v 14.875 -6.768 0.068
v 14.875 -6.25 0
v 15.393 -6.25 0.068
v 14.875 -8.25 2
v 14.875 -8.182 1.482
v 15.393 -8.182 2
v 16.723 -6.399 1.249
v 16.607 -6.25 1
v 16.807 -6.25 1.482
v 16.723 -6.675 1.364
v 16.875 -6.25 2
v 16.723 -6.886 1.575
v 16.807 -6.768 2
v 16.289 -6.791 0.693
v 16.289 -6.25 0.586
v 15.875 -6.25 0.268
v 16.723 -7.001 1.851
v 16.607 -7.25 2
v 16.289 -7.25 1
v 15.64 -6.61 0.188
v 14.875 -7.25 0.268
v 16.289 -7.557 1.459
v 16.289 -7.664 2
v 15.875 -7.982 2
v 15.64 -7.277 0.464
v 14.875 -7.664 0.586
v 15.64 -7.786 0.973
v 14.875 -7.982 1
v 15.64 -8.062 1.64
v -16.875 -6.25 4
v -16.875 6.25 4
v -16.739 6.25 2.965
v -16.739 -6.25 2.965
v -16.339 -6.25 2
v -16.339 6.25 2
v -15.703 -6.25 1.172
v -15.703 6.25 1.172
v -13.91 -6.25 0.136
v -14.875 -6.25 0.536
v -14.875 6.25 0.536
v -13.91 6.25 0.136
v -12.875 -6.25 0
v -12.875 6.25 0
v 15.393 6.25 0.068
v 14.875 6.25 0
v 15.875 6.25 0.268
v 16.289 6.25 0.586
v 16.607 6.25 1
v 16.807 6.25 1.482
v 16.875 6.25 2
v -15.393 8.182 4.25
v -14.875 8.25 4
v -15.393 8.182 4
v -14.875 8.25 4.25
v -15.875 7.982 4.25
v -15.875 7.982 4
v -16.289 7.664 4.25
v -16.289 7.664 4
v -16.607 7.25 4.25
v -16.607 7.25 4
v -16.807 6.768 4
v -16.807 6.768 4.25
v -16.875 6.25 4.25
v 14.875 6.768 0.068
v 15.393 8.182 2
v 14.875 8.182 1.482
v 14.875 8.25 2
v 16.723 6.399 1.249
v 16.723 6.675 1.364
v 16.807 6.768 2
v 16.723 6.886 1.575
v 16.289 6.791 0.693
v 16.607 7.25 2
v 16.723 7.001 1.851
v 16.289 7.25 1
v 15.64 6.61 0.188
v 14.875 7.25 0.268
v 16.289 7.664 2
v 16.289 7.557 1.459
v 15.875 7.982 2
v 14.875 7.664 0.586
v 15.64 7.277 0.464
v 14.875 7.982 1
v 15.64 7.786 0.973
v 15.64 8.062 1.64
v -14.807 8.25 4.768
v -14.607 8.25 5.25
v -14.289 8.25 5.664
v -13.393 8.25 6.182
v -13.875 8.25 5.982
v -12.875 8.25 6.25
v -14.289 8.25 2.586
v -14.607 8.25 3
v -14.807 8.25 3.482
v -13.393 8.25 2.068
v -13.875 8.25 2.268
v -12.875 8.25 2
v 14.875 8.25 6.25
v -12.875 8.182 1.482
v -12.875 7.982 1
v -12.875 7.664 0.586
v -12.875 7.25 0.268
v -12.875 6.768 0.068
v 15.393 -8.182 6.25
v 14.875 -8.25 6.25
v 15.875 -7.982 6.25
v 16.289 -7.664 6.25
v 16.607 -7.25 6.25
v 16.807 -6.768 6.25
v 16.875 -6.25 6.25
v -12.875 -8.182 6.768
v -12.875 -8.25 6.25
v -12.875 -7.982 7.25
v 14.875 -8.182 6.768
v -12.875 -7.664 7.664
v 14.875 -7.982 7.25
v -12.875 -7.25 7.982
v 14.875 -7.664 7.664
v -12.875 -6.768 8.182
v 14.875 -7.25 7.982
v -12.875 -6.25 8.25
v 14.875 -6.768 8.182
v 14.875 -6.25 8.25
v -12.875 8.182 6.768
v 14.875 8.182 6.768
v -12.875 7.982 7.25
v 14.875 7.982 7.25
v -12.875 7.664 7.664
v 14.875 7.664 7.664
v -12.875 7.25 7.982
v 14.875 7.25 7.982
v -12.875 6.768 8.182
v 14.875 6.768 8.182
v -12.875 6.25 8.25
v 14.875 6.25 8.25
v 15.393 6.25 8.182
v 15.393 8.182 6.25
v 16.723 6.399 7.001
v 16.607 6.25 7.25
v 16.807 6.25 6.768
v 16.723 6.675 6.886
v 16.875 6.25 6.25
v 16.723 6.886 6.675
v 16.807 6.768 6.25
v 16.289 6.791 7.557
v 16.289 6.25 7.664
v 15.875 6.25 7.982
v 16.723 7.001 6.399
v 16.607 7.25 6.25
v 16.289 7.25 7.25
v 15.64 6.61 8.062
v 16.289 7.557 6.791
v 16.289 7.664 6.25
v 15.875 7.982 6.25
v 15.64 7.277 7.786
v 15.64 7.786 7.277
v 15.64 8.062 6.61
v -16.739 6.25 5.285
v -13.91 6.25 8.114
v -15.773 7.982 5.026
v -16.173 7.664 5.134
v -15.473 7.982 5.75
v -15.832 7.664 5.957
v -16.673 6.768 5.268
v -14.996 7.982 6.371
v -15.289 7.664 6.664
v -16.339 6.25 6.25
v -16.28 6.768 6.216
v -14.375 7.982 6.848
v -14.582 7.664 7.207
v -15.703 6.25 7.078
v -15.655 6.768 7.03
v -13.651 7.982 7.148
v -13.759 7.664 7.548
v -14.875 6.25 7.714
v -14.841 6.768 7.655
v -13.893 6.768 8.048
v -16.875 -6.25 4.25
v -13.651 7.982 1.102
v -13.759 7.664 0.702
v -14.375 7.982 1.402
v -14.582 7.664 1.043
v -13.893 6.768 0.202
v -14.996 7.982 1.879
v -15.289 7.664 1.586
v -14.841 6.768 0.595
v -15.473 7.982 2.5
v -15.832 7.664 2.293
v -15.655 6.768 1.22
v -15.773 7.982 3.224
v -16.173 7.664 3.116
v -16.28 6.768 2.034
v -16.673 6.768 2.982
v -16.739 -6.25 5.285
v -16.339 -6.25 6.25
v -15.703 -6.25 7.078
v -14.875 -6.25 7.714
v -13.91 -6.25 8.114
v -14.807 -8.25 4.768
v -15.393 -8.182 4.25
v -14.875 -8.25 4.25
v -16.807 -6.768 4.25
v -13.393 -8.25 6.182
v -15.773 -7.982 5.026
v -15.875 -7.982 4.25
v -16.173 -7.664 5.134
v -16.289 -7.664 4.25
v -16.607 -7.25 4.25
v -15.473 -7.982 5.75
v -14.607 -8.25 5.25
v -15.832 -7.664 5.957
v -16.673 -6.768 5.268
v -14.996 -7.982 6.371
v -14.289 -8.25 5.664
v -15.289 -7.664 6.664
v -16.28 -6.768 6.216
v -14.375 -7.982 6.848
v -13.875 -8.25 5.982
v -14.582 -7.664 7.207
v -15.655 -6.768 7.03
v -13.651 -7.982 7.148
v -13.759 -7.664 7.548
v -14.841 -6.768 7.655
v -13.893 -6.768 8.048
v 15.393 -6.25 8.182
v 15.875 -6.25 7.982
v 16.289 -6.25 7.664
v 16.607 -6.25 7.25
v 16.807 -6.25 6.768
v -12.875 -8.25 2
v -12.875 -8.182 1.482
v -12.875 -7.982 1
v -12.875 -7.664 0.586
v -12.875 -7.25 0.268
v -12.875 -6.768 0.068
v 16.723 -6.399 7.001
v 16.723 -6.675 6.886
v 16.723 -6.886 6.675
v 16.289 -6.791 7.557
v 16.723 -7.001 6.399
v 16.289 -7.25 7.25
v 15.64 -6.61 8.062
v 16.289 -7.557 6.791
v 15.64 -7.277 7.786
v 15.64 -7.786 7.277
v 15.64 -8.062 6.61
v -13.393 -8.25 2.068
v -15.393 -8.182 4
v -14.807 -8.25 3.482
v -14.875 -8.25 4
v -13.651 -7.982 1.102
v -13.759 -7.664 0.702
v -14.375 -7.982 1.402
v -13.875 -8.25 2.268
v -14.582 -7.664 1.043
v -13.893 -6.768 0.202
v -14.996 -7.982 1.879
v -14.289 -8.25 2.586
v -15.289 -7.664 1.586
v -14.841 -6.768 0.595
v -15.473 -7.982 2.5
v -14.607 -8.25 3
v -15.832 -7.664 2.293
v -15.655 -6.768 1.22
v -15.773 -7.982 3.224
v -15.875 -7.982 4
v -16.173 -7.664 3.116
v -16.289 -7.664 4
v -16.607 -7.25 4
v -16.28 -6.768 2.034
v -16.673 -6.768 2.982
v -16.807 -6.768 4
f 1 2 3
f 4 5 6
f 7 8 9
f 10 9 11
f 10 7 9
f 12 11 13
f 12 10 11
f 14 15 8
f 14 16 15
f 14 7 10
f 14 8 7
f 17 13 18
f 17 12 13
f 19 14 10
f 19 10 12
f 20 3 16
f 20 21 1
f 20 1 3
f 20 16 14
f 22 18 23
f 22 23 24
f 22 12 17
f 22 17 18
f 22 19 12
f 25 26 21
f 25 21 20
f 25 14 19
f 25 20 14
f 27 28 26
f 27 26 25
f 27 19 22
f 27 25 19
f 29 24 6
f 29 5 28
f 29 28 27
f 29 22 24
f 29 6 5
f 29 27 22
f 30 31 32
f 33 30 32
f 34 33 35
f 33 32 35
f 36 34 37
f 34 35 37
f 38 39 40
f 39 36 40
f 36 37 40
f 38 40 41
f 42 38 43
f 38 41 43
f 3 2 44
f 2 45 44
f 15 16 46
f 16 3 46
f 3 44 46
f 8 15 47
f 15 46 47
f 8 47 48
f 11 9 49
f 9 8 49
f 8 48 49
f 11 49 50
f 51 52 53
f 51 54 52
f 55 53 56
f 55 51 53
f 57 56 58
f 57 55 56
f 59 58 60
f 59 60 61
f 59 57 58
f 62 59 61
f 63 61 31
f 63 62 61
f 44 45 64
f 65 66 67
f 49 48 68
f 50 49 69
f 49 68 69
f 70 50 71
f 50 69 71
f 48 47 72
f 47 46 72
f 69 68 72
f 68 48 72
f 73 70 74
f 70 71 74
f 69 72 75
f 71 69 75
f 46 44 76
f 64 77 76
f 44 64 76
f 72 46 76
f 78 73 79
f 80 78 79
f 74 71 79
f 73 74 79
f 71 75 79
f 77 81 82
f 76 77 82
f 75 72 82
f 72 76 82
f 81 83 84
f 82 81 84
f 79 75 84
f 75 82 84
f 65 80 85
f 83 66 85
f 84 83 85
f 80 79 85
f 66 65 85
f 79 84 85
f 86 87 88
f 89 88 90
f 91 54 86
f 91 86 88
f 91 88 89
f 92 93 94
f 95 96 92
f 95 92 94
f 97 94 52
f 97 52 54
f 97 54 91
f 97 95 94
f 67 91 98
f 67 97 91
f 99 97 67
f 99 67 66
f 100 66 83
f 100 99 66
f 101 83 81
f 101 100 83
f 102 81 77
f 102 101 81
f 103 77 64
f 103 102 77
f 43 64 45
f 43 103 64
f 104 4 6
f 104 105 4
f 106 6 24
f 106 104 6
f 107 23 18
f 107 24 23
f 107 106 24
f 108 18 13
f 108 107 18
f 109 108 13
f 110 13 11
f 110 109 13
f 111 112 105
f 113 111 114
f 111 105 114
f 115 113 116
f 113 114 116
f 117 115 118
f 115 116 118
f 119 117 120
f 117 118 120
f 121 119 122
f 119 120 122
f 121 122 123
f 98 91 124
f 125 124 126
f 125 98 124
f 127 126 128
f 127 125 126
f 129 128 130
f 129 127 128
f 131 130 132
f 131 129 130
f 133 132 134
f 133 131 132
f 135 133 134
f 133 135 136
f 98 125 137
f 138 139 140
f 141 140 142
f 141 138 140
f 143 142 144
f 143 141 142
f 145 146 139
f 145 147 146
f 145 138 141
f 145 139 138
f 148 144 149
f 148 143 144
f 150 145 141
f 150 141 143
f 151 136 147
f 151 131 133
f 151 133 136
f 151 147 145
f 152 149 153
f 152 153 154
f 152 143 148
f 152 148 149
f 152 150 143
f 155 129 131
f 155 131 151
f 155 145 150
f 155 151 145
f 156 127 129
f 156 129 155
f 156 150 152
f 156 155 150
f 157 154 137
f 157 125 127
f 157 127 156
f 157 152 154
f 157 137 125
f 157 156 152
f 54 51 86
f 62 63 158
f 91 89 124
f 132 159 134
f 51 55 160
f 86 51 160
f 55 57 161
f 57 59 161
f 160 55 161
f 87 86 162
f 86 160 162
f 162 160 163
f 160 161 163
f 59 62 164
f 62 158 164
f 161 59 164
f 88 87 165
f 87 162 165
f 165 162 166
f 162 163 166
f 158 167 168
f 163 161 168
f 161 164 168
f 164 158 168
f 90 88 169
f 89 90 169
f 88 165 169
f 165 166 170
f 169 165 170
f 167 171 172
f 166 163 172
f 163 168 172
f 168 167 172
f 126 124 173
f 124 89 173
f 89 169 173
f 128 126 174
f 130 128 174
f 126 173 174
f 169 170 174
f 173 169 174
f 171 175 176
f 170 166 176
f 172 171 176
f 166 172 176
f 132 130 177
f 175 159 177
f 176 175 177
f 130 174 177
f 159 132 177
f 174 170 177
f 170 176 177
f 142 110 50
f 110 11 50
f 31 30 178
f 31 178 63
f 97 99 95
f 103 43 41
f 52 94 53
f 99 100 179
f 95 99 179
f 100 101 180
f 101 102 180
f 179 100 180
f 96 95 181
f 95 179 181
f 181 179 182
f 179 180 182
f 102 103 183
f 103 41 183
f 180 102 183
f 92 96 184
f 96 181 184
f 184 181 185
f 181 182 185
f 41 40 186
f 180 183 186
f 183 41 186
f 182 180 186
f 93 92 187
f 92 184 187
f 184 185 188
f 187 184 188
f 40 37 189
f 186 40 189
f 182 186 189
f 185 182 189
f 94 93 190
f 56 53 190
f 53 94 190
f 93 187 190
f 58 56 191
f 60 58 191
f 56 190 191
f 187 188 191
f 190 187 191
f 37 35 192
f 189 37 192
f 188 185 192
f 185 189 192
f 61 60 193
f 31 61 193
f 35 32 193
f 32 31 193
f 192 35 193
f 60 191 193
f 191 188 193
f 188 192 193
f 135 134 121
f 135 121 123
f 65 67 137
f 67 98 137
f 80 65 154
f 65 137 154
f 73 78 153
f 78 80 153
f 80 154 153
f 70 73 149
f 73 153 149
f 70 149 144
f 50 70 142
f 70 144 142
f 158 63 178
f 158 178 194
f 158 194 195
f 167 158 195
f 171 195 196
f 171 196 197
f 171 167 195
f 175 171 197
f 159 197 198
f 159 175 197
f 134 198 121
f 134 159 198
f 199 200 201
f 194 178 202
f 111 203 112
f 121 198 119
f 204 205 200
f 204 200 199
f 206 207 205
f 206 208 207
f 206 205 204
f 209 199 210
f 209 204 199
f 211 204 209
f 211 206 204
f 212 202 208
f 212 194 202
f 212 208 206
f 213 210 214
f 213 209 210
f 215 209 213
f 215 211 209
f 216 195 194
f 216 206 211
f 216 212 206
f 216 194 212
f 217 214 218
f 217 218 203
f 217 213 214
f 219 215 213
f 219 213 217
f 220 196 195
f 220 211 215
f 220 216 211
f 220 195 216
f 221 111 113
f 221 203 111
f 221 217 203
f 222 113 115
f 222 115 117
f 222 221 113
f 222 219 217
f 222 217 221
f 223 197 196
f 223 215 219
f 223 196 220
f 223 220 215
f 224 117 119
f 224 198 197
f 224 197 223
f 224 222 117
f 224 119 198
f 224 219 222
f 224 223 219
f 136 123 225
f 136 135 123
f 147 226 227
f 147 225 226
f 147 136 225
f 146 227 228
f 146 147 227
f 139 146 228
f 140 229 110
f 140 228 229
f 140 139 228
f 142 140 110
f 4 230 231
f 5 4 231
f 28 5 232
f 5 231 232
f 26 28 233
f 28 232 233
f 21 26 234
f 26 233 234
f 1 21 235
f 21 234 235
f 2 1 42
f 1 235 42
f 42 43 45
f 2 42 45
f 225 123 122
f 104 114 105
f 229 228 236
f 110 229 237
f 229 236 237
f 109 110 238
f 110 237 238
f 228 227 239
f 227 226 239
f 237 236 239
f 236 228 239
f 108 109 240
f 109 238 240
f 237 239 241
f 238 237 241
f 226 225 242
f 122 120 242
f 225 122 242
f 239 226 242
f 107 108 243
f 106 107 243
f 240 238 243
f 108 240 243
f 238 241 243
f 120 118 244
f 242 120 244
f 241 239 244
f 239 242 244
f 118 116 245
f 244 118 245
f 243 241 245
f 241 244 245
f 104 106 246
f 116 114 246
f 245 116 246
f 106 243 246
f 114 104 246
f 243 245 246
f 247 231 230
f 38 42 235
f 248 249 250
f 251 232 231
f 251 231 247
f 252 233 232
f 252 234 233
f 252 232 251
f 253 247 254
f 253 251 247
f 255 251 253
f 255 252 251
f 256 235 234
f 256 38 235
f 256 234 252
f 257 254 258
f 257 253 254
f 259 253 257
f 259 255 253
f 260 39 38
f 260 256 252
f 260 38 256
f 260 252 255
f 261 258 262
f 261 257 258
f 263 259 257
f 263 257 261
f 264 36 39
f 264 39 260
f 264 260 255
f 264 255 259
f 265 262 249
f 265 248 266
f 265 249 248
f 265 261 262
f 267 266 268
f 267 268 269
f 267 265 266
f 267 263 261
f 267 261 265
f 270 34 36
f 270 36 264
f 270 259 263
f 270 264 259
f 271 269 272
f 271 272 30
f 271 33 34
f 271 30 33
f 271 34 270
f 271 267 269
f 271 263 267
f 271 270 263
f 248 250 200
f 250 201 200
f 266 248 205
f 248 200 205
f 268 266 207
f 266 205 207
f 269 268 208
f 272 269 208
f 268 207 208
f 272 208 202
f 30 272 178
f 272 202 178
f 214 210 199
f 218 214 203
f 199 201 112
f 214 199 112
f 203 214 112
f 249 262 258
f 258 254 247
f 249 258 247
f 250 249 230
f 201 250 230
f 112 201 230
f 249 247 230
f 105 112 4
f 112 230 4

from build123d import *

# Parameters (mm, degrees)
F0_W     = 33.75
F0_H     = 16.5
F1_DEPTH = 8.25
F2_R     = 4
F3_R     = 2


with BuildPart() as f1:
    # F0 (on Top) → F1 (new body)
    with BuildSketch(Plane.XY):
        Rectangle(F0_W, F0_H)
    extrude(amount=F1_DEPTH)

    # F2
    f2_edges = [f1.edges().sort_by_distance(p)[0] for p in [
        (-16.875, 0, 8.25),
        (-16.875, 0, 0),
    ]]
    fillet(f2_edges, radius=F2_R)

    # F3
    f3_edges = [f1.edges().sort_by_distance(p)[0] for p in [
        (2, -8.25, 8.25),
        (2, 8.25, 8.25),
        (16.875, 0, 8.25),
        (16.875, 0, 0),
        (16.875, -8.25, 4.125),
        (16.875, 8.25, 4.125),
    ]]
    fillet(f3_edges, radius=F3_R)


solid = f1.part
